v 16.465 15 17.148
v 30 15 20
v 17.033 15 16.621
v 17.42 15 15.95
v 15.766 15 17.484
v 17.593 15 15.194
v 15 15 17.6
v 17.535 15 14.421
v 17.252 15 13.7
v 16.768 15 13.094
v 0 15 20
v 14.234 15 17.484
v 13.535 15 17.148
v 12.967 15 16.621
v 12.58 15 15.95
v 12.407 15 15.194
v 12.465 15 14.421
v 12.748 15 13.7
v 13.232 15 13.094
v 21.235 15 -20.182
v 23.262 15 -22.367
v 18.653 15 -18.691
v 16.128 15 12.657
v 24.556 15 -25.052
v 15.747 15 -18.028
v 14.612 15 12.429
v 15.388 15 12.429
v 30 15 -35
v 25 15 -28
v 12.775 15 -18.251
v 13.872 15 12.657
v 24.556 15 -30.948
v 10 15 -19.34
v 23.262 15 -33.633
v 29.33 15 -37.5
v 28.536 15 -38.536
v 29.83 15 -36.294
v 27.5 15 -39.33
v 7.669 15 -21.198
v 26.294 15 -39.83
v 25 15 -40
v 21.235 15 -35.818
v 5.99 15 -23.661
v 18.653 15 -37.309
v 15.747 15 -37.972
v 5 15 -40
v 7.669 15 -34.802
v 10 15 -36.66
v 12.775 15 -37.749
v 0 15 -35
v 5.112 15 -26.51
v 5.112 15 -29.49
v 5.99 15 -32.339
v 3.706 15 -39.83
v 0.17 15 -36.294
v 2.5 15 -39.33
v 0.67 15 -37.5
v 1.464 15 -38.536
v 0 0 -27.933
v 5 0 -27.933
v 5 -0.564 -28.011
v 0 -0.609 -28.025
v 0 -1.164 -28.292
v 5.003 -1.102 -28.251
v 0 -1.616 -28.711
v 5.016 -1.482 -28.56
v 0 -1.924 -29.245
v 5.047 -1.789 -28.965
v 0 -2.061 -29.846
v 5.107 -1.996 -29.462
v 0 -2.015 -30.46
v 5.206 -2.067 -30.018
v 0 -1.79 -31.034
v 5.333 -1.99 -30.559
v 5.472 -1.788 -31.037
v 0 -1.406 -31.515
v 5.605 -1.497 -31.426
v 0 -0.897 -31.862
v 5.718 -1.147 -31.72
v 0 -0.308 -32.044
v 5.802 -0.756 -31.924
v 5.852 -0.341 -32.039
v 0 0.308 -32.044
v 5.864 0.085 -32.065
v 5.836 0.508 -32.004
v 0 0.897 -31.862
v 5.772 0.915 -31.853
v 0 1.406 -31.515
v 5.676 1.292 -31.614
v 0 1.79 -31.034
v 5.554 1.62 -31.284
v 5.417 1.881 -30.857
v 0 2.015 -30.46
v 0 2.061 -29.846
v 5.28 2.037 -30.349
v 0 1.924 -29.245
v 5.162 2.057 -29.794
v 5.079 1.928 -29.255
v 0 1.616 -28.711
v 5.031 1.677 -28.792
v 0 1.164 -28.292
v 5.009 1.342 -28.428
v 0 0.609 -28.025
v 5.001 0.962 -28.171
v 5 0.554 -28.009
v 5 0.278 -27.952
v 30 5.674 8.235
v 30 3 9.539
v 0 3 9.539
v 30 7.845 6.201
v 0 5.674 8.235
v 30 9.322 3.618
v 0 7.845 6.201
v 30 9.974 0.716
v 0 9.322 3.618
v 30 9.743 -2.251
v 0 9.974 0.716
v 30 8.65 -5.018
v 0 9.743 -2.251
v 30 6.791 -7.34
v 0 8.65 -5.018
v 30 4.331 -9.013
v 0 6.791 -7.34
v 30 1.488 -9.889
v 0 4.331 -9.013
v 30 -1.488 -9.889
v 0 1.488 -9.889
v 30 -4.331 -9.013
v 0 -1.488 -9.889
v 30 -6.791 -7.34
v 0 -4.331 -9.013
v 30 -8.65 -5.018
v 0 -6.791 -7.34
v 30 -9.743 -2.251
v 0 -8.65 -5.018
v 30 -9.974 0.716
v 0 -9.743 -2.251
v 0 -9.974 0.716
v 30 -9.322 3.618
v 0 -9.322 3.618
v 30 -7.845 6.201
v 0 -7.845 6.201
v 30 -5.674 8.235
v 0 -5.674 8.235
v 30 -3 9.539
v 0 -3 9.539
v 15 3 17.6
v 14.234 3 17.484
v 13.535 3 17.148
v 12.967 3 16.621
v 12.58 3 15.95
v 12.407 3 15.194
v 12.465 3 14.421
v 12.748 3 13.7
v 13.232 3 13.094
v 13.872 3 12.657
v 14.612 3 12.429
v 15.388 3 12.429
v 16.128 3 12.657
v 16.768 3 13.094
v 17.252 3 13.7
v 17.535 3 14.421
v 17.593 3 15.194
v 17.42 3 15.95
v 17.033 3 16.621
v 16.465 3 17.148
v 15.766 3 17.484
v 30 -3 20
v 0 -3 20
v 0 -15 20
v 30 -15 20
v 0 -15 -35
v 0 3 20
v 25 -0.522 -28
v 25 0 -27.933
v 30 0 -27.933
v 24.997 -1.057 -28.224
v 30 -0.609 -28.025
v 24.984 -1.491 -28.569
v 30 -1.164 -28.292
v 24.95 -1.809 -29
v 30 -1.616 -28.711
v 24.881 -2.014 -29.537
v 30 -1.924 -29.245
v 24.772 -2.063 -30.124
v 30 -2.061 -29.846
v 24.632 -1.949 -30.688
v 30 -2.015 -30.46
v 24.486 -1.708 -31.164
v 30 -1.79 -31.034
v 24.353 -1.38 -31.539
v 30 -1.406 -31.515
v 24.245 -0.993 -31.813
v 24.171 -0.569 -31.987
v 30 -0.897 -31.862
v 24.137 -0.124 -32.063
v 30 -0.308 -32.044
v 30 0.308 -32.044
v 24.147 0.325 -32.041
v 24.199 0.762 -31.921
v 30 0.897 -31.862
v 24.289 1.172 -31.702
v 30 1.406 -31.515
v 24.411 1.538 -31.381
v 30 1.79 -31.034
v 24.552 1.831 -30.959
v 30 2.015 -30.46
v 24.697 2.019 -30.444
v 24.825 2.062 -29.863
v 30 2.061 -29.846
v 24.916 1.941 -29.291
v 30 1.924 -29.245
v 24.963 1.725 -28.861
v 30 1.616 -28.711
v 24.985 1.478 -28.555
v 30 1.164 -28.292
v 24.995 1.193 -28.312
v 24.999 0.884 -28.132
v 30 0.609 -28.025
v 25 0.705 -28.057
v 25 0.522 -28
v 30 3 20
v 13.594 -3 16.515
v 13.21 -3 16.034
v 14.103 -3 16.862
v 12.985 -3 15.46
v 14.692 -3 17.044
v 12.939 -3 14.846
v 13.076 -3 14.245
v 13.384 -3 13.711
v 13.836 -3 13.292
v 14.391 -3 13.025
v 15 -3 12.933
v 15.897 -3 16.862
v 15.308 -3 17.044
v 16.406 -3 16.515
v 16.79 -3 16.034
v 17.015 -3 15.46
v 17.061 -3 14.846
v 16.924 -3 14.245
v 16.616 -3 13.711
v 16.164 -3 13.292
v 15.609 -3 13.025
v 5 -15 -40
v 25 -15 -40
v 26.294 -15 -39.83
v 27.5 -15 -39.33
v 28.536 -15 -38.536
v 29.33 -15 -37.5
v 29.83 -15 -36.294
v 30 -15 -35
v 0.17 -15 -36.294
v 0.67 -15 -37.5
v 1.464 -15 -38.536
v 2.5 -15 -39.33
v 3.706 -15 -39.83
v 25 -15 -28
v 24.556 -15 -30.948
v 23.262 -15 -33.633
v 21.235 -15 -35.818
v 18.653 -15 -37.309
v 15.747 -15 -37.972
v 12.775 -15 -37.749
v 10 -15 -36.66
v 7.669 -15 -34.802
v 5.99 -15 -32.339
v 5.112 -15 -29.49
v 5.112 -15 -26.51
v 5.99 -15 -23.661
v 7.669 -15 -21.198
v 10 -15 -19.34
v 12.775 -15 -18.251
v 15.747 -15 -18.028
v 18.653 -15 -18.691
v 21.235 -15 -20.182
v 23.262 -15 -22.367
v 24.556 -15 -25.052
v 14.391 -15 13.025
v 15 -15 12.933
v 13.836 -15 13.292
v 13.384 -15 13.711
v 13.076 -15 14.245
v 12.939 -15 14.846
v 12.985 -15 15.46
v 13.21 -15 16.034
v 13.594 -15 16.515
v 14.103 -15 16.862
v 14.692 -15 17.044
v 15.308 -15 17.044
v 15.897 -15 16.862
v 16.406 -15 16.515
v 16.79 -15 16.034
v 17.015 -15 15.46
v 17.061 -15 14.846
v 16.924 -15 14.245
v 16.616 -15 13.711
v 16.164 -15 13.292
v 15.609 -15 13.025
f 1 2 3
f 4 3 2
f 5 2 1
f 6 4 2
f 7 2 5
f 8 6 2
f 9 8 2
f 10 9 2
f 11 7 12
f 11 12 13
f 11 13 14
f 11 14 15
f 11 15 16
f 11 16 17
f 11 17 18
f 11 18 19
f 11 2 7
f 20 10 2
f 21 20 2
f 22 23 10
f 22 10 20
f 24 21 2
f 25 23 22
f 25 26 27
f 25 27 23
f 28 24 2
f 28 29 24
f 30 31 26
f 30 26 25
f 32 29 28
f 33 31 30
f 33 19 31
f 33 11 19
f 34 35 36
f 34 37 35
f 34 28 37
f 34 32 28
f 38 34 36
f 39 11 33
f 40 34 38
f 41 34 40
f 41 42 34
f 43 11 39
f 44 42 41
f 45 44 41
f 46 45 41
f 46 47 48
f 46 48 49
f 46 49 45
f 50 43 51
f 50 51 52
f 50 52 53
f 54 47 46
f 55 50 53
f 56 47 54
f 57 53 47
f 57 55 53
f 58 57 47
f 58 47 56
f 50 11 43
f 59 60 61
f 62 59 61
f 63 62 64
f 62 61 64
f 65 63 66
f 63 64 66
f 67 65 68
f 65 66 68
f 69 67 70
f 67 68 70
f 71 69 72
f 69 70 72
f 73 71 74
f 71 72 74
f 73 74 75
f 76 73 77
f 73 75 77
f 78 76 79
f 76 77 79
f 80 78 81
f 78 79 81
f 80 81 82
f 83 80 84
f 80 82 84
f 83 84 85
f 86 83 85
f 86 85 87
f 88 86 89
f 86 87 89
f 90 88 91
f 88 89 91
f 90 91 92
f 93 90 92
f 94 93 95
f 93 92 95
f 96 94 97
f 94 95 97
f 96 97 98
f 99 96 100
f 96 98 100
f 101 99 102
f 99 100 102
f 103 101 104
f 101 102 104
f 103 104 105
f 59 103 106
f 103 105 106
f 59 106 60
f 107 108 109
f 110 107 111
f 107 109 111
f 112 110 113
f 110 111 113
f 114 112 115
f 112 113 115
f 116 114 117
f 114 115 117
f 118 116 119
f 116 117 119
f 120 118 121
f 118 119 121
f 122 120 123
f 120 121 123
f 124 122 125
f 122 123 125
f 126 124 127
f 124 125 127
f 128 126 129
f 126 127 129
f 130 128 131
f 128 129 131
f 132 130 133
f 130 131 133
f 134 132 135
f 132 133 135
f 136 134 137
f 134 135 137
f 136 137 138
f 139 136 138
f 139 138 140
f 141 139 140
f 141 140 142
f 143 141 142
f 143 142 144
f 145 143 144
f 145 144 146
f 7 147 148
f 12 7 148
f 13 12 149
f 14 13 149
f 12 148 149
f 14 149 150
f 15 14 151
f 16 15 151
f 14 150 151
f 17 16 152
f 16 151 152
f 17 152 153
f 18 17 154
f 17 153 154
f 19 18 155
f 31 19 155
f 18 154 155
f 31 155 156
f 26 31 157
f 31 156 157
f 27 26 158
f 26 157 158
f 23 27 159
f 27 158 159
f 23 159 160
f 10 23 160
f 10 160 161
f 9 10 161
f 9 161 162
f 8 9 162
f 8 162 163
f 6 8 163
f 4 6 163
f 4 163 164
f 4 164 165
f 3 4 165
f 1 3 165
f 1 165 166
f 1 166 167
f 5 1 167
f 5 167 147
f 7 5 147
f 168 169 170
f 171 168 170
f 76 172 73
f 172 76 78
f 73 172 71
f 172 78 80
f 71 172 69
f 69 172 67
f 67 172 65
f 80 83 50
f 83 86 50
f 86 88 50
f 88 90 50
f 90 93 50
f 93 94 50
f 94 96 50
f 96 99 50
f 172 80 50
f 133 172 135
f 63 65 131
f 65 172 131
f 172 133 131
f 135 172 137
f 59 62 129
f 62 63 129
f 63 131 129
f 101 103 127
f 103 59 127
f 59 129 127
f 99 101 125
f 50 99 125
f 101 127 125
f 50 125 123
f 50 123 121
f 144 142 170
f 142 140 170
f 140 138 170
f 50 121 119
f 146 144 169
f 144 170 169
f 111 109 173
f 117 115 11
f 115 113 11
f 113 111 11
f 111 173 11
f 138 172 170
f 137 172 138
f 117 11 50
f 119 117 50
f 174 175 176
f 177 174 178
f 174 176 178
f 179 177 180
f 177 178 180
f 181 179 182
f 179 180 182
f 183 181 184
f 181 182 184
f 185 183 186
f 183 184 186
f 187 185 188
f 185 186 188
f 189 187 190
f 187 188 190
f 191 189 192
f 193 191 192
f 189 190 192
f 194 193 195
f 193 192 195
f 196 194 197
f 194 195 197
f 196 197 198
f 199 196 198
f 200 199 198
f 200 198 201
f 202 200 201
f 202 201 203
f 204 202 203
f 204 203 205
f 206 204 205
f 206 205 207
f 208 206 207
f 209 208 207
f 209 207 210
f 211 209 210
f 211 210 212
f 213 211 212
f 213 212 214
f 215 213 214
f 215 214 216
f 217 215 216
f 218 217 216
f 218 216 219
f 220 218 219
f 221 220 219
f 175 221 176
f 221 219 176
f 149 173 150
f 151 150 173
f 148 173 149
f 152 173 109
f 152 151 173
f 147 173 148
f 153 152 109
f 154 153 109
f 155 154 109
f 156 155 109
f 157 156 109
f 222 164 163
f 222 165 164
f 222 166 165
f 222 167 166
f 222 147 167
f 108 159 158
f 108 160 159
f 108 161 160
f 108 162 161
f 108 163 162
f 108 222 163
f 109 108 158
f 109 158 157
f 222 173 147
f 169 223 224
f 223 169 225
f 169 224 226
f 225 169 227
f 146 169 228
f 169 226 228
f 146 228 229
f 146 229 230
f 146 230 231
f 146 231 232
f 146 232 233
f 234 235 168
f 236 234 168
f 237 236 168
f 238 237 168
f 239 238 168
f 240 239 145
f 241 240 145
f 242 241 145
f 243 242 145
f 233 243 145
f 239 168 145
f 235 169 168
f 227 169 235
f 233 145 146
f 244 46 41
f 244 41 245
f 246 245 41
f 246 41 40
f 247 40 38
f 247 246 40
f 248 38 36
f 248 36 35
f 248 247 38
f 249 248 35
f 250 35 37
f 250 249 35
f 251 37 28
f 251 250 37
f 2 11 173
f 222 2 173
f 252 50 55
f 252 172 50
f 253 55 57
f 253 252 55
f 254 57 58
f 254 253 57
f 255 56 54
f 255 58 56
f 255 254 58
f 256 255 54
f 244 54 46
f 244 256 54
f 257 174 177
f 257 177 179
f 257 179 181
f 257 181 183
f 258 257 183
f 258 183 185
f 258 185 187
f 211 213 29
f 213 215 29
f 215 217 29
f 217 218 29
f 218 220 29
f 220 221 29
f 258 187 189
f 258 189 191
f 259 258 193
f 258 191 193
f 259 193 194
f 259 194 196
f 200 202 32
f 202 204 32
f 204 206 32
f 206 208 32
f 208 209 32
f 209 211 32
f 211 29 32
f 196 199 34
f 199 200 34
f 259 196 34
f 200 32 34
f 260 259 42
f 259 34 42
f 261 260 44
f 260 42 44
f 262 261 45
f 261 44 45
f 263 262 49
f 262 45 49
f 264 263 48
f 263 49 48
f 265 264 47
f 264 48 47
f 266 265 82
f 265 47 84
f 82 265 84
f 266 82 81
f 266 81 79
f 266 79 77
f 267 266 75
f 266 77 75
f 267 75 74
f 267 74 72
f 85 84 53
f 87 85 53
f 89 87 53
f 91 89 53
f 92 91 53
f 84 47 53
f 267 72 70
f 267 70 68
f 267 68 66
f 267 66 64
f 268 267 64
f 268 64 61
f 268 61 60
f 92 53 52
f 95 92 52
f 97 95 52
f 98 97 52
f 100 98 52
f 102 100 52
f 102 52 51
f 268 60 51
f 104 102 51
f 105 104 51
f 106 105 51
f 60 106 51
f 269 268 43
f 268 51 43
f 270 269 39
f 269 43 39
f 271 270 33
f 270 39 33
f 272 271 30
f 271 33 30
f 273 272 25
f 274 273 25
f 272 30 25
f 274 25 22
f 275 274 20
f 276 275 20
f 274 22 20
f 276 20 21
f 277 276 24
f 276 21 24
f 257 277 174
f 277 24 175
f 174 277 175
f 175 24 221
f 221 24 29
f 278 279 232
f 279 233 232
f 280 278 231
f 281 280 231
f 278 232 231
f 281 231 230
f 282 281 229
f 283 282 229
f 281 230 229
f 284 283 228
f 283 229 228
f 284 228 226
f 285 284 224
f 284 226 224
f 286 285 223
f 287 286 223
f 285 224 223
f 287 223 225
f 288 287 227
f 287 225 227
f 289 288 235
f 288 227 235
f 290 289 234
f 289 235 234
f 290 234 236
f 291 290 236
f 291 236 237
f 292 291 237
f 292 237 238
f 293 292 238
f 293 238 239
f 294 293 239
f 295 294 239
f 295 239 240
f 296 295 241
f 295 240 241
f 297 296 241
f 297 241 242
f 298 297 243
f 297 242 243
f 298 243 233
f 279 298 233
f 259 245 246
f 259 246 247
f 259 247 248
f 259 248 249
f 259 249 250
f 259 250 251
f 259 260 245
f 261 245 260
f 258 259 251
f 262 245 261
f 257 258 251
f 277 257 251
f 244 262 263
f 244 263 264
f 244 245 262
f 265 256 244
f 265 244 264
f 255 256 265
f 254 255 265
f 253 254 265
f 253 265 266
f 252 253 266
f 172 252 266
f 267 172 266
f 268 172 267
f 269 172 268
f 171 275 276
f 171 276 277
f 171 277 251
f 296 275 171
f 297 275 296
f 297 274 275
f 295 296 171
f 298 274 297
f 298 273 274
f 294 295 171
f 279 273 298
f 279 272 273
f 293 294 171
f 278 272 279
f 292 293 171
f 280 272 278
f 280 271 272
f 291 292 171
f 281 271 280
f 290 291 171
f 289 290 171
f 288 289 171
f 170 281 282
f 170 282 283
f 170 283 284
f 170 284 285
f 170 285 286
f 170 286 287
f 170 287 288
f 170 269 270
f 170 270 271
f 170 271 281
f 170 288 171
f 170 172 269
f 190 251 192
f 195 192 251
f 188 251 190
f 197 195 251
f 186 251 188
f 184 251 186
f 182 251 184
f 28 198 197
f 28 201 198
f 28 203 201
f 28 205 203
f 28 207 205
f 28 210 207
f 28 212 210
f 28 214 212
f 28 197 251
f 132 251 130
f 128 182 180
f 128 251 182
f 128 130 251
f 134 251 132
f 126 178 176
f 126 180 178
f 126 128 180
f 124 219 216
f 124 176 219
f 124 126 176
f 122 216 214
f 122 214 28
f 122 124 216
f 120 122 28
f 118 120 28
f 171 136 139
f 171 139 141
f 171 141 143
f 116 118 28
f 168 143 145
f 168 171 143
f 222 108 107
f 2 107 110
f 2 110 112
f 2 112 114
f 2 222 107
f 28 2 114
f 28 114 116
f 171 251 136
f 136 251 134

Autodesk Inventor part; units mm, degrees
ref_plane "YZ Plane" through (0, 0, 0) normal (1, 0, 0) x (0, 1, 0)
ref_plane "XZ Plane" through (0, 0, 0) normal (0, 1, 0) x (-1, 0, 0)
ref_plane "XY Plane" through (0, 0, 0) normal (0, 0, 1) x (1, 0, 0)
sketch "Skizze1" plane through (0, 0, 0) normal (1, 0, 0) x (0, 1, 0)
  circle A0 centre (0, 0) radius 10
  line L0 (15, 0) -> (15, -40)
  line L1 (15, -40) -> (-15, -40)
  line L2 (-15, -40) -> (-15, 0)
  line L3 (15, 0) -> (15, 20)
  line L4 (15, 20) -> (-15, 20)
  line L5 (-15, 20) -> (-15, 0)
  dimension "d0" = 20
  dimension "d2" = 40
  dimension "d3" = 30
  dimension "d4" = 90
  dimension "d40" = 20
extrude "Extrusion1" add sketch "Skizze1" along normal blind 30
sketch "Skizze3" plane through (30, 0, 0) normal (1, 0, 0) x (0, 0, -1)
  line L0 (0, 0) -> (-20, 0)
  line L1 (-20, 0) -> (-20, 3)
  line L2 (-20, 3) -> (0, 3)
  line L3 (0, 3) -> (0, 0)
  line L4 (0, 0) -> (-20, 0)
  line L5 (-20, 0) -> (-20, -3)
  line L6 (-20, -3) -> (0, -3)
  line L7 (0, -3) -> (0, 0)
  dimension "d7" = 20
  dimension "d8" = 3
  dimension "d9" = 3
extrude "Extrusion2" cut sketch "Skizze3" against normal through all
sketch "Skizze6" plane through (0, 0, 0) normal (-1, 0, 0) x (0, 0, 1)
  arc A0 (9.5394, 3) -> (9.5394, -3) centre (0, 0) ccw projected
  line L0 (0, 0) -> (-30, 0)
  dimension "d31" = 30
hole "Bohrung3" at (0, 0, -30) direction (1, 0, 0) diameter 4.134 end through all thread size "M5x0.8" class "6H" standard "ISO Metric profile"
fillet "Rundung1" radius 5 2 edges at (0, 0, -40) (30, 0, -40)
sketch "Skizze9" plane through (0, 15, 20) normal (0, 1, 0) x (1, 0, 0)
  line L0 (30, 47.933) -> (0, 47.933) projected
  line L1 (5, 60) -> (25, 60) projected
  line L2 (15, 60) -> (15, 48)
  circle A0 centre (15, 48) radius 10
  point P0 (0, 20)
  dimension "d79" = 12
  dimension "d80" = 20
extrude "Extrusion4" cut sketch "Skizze9" against normal through all
sketch "Skizze10" plane through (0, 15, 20) normal (0, 1, 0) x (1, 0, 0)
  line L0 (0, 0) -> (30, 0) projected
  line L1 (15, 0) -> (15, 5)
  point P0 (0, 20)
  dimension "d55" = 5
hole "Bohrung5" at (15, 15, 15) direction (0, -1, 0) diameter 5.2 depth 15 tip angle 118
sketch "Skizze12" plane through (0, -15, 20) normal (0, -1, 0) x (1, 0, 0)
  circle A0 centre (15, -5) radius 2.6 projected
  line L0 (15, -5) -> (15, -13.3811)
  circle A1 centre (15, -5) radius 2.5
  point P0 (0, -20)
  dimension "d71" = 5
hole "Bohrung7" at (15, -15, 15) direction (0, 1, 0) diameter 4.134 end through all thread size "M5x0.8" class "6H" standard "ISO Metric profile"
properties part number "Verbindung" material "Edelstahl"
